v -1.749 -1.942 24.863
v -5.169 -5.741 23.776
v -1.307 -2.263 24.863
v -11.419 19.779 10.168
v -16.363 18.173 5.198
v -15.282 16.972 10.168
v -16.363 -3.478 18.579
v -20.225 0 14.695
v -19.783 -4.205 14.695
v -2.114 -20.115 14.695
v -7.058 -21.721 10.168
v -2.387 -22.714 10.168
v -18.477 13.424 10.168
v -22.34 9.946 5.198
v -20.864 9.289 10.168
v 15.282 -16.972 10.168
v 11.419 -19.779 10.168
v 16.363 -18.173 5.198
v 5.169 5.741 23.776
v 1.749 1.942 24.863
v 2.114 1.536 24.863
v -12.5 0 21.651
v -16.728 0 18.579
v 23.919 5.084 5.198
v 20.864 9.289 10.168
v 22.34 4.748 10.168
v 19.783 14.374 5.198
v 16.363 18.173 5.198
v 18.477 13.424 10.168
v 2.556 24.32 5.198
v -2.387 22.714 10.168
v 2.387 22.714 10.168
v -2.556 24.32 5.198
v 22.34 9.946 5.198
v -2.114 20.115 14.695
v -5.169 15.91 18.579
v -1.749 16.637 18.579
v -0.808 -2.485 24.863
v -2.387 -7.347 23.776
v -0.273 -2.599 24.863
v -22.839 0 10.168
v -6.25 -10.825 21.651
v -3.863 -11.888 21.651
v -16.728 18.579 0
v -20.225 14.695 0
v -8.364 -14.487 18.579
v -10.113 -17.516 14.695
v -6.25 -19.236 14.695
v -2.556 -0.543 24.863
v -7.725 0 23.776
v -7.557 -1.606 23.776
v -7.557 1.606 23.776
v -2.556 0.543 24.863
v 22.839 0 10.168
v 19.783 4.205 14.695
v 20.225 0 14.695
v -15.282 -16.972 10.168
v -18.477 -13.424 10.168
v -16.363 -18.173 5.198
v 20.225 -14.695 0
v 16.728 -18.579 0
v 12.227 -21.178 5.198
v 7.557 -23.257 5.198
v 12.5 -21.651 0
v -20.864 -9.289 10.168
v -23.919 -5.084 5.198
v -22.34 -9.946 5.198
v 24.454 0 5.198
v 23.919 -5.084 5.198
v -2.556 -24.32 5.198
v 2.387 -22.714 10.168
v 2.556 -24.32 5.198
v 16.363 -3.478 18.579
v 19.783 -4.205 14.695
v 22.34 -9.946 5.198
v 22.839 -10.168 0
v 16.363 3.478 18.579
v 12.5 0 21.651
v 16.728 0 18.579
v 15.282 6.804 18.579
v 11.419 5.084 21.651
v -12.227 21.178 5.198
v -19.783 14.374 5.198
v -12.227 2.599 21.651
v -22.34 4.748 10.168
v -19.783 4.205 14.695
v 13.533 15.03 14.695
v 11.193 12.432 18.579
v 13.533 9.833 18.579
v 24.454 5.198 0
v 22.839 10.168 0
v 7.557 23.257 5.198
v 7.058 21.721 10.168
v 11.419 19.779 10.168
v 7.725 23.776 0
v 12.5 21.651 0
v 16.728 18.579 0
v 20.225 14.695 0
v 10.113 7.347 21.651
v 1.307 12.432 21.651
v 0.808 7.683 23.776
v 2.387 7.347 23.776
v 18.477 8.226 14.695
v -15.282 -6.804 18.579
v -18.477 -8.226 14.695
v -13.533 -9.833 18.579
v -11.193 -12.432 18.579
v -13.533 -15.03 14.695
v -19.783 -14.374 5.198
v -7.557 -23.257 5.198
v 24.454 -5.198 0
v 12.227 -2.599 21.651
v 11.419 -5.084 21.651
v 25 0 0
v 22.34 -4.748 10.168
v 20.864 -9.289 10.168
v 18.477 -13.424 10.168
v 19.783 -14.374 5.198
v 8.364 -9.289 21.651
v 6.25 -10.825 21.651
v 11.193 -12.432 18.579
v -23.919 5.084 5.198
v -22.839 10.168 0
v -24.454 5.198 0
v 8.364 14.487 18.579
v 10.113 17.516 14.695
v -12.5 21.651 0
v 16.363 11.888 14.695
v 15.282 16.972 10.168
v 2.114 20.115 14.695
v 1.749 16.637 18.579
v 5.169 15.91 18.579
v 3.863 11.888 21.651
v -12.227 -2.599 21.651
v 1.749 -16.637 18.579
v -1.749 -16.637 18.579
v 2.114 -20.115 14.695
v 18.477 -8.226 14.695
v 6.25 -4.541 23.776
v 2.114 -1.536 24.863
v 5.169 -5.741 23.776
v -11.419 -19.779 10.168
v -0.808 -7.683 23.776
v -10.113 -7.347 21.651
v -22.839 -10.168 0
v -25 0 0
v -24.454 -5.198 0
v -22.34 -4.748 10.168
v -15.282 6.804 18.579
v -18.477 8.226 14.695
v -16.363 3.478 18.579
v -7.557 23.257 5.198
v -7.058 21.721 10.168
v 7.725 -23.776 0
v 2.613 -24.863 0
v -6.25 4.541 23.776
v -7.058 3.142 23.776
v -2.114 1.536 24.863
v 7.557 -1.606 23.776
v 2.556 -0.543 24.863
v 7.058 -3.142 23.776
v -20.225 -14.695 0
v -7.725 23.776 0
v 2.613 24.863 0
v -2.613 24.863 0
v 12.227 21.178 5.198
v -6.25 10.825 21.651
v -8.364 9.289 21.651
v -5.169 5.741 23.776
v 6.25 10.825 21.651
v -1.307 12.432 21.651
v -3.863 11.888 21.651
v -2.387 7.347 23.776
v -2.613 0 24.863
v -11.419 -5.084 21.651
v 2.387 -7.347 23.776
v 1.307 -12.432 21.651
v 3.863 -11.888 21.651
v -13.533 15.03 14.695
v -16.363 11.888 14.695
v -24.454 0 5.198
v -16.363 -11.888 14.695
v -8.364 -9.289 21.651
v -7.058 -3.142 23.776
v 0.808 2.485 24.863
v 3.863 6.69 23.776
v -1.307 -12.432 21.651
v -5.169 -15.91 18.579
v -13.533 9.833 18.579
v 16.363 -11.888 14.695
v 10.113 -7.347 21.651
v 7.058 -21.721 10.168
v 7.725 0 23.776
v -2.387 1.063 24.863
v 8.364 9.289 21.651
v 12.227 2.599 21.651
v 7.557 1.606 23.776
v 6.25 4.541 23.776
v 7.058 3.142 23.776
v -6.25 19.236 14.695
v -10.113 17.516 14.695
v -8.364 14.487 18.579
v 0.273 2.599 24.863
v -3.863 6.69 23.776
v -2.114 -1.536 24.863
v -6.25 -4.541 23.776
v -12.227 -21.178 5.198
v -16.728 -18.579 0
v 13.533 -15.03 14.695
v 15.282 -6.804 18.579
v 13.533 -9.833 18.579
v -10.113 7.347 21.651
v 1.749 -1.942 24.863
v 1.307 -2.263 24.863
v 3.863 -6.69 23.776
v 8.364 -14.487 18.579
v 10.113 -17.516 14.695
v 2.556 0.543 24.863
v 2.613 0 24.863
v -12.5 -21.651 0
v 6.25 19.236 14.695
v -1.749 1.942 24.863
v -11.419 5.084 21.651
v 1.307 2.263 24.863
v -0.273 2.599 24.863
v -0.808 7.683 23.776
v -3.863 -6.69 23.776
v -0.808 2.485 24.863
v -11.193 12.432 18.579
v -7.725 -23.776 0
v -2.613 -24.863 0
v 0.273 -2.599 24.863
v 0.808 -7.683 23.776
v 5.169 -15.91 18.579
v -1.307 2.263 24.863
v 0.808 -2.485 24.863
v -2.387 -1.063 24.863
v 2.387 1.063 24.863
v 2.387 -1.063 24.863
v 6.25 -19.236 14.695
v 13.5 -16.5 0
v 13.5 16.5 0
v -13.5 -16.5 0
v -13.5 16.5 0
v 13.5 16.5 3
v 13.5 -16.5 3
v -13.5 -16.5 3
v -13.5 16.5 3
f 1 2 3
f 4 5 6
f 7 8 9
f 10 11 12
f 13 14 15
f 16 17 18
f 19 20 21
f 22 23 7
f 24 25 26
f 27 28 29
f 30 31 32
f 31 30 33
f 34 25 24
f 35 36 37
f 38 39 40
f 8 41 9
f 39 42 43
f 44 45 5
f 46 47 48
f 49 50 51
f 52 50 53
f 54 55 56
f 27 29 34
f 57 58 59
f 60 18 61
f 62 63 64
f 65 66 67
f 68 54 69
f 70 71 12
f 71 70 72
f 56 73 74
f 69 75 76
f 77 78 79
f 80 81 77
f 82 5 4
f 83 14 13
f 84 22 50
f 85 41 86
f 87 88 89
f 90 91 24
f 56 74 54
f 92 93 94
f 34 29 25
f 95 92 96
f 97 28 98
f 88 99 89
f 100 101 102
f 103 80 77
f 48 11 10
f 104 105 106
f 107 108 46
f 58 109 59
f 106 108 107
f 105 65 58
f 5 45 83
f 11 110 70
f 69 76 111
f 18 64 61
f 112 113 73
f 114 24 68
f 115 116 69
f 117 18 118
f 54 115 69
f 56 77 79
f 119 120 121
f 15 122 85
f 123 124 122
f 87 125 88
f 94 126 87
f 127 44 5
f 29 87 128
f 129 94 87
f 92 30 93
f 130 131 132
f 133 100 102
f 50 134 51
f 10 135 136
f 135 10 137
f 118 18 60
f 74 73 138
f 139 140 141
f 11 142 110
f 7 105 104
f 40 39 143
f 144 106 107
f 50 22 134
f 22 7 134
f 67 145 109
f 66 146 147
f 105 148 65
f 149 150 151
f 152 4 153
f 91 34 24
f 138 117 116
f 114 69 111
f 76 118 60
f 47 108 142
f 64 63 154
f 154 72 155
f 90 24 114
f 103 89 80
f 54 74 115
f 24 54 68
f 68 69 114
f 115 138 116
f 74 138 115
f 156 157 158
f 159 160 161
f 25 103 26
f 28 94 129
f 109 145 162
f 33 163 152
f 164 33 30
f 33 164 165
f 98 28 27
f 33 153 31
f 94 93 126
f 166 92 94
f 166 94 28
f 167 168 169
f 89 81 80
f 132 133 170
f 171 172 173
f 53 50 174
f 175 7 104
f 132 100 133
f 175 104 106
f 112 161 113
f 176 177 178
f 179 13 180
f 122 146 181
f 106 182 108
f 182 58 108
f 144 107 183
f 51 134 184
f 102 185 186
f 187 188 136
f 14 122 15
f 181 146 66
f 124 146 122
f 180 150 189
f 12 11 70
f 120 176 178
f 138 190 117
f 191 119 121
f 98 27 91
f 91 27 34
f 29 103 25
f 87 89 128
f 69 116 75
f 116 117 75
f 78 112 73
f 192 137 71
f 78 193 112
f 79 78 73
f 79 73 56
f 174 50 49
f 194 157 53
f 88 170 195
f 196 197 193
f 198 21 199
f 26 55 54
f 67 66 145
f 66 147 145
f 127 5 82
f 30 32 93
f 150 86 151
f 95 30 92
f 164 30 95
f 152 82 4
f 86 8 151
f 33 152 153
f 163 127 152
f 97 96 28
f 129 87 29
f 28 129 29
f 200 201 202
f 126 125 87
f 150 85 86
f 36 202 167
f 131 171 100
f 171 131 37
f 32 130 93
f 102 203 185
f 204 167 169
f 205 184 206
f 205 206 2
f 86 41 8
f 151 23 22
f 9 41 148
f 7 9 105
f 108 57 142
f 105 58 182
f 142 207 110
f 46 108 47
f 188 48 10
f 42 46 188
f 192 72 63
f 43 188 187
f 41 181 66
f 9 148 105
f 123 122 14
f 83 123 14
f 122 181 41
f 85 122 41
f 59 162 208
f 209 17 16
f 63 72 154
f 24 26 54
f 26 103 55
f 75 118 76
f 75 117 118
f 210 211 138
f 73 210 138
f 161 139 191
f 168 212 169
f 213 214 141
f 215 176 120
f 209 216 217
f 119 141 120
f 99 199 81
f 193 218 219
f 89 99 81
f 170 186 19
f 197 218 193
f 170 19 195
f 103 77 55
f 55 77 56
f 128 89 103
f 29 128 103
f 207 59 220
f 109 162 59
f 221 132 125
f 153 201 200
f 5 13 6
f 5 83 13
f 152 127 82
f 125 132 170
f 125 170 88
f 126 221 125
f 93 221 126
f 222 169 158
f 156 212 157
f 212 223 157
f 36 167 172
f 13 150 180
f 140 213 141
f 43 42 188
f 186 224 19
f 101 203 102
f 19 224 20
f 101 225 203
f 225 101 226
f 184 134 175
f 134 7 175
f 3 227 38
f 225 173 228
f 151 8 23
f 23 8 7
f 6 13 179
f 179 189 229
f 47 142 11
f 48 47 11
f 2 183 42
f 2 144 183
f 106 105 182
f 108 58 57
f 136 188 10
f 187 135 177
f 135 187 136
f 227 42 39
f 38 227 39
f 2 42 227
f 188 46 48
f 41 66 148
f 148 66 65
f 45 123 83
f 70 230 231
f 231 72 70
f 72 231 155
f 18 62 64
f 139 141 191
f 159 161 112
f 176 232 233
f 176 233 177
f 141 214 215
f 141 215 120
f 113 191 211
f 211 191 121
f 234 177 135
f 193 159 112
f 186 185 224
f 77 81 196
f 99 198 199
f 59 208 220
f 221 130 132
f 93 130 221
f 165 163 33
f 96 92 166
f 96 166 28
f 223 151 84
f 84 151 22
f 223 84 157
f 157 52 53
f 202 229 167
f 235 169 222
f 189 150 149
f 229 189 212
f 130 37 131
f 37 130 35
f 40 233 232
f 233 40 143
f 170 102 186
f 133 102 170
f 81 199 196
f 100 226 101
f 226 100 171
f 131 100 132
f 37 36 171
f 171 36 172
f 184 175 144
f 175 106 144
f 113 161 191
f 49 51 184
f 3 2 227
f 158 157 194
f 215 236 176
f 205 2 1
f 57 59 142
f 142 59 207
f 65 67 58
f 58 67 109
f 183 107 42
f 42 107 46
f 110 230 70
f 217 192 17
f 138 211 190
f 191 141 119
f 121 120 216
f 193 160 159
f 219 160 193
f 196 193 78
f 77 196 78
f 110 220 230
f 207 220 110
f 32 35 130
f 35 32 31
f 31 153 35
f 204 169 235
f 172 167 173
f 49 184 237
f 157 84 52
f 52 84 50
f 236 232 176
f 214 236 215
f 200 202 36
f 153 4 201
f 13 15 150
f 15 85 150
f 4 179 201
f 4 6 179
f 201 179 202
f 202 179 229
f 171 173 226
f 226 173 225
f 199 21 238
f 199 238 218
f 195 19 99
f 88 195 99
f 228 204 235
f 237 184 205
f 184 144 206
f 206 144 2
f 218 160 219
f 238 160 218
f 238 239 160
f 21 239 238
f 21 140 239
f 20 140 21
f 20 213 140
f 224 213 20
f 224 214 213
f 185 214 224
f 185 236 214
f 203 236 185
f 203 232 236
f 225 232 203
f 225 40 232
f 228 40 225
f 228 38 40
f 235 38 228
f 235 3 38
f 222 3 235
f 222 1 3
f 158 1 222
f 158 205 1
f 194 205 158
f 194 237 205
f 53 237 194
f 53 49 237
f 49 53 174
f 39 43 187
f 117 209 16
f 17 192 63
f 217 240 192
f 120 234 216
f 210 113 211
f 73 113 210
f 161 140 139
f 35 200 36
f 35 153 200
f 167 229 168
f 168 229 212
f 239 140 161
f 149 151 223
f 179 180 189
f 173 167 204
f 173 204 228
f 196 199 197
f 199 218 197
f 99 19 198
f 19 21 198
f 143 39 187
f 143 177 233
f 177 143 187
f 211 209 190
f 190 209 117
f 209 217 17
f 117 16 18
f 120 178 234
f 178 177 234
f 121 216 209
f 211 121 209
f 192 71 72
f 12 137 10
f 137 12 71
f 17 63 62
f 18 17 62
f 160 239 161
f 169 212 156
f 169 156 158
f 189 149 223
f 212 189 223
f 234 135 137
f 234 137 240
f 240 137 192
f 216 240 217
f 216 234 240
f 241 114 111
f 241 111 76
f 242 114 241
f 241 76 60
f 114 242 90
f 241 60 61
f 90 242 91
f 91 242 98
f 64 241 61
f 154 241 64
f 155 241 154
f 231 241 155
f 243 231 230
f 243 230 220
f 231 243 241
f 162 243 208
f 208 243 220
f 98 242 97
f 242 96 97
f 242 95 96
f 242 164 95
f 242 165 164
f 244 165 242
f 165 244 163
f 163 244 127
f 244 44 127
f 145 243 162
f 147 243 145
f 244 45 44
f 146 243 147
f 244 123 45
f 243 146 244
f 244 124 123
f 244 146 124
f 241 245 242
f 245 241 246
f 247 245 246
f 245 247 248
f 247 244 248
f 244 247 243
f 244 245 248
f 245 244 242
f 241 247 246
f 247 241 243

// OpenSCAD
// ============================================================
// PRINT PROFILE (see PRINTER.md for full slicer profile values)
// ------------------------------------------------------------
// Material:    PETG Basic — this is a stapler top/handle cap: it takes a real
//               compressive press/impact force transmitted through it every
//               single use, repeatedly over the part's life. PETG's impact
//               toughness is the right call here, not PLA's brittleness.
// Nozzle:      0.4mm — no fine detail, plain sphere-derived dome shape.
// Quality:     0.20mm Standard.
// Infill:      40% — genuinely load-bearing under repeated press force, well
//               above the printer's 15% decorative default.
// Orientation: verified directly from the geometry — sphere(25) minus a cube
//               cut from z=-45..0 leaves only the upper hemisphere (a dome
//               with a flat bottom at z=0), plus a small notch cut near
//               z=-1..3 (likely a mechanism tab/hinge slot). Print dome-up,
//               flat face down on the bed — fully self-supporting, no
//               overhangs, no supports needed.
// Overrides:   the notch cut sits close to the bed-contact face; check the
//               first layer doesn't leave an unsupported sliver there before
//               committing to a full print.
// ============================================================
difference(){
sphere(25);
translate([-45,-45,-45])cube([90,90,45]);
translate([-13.5,-16.5,-1])cube([27,33,4]);
      
}
